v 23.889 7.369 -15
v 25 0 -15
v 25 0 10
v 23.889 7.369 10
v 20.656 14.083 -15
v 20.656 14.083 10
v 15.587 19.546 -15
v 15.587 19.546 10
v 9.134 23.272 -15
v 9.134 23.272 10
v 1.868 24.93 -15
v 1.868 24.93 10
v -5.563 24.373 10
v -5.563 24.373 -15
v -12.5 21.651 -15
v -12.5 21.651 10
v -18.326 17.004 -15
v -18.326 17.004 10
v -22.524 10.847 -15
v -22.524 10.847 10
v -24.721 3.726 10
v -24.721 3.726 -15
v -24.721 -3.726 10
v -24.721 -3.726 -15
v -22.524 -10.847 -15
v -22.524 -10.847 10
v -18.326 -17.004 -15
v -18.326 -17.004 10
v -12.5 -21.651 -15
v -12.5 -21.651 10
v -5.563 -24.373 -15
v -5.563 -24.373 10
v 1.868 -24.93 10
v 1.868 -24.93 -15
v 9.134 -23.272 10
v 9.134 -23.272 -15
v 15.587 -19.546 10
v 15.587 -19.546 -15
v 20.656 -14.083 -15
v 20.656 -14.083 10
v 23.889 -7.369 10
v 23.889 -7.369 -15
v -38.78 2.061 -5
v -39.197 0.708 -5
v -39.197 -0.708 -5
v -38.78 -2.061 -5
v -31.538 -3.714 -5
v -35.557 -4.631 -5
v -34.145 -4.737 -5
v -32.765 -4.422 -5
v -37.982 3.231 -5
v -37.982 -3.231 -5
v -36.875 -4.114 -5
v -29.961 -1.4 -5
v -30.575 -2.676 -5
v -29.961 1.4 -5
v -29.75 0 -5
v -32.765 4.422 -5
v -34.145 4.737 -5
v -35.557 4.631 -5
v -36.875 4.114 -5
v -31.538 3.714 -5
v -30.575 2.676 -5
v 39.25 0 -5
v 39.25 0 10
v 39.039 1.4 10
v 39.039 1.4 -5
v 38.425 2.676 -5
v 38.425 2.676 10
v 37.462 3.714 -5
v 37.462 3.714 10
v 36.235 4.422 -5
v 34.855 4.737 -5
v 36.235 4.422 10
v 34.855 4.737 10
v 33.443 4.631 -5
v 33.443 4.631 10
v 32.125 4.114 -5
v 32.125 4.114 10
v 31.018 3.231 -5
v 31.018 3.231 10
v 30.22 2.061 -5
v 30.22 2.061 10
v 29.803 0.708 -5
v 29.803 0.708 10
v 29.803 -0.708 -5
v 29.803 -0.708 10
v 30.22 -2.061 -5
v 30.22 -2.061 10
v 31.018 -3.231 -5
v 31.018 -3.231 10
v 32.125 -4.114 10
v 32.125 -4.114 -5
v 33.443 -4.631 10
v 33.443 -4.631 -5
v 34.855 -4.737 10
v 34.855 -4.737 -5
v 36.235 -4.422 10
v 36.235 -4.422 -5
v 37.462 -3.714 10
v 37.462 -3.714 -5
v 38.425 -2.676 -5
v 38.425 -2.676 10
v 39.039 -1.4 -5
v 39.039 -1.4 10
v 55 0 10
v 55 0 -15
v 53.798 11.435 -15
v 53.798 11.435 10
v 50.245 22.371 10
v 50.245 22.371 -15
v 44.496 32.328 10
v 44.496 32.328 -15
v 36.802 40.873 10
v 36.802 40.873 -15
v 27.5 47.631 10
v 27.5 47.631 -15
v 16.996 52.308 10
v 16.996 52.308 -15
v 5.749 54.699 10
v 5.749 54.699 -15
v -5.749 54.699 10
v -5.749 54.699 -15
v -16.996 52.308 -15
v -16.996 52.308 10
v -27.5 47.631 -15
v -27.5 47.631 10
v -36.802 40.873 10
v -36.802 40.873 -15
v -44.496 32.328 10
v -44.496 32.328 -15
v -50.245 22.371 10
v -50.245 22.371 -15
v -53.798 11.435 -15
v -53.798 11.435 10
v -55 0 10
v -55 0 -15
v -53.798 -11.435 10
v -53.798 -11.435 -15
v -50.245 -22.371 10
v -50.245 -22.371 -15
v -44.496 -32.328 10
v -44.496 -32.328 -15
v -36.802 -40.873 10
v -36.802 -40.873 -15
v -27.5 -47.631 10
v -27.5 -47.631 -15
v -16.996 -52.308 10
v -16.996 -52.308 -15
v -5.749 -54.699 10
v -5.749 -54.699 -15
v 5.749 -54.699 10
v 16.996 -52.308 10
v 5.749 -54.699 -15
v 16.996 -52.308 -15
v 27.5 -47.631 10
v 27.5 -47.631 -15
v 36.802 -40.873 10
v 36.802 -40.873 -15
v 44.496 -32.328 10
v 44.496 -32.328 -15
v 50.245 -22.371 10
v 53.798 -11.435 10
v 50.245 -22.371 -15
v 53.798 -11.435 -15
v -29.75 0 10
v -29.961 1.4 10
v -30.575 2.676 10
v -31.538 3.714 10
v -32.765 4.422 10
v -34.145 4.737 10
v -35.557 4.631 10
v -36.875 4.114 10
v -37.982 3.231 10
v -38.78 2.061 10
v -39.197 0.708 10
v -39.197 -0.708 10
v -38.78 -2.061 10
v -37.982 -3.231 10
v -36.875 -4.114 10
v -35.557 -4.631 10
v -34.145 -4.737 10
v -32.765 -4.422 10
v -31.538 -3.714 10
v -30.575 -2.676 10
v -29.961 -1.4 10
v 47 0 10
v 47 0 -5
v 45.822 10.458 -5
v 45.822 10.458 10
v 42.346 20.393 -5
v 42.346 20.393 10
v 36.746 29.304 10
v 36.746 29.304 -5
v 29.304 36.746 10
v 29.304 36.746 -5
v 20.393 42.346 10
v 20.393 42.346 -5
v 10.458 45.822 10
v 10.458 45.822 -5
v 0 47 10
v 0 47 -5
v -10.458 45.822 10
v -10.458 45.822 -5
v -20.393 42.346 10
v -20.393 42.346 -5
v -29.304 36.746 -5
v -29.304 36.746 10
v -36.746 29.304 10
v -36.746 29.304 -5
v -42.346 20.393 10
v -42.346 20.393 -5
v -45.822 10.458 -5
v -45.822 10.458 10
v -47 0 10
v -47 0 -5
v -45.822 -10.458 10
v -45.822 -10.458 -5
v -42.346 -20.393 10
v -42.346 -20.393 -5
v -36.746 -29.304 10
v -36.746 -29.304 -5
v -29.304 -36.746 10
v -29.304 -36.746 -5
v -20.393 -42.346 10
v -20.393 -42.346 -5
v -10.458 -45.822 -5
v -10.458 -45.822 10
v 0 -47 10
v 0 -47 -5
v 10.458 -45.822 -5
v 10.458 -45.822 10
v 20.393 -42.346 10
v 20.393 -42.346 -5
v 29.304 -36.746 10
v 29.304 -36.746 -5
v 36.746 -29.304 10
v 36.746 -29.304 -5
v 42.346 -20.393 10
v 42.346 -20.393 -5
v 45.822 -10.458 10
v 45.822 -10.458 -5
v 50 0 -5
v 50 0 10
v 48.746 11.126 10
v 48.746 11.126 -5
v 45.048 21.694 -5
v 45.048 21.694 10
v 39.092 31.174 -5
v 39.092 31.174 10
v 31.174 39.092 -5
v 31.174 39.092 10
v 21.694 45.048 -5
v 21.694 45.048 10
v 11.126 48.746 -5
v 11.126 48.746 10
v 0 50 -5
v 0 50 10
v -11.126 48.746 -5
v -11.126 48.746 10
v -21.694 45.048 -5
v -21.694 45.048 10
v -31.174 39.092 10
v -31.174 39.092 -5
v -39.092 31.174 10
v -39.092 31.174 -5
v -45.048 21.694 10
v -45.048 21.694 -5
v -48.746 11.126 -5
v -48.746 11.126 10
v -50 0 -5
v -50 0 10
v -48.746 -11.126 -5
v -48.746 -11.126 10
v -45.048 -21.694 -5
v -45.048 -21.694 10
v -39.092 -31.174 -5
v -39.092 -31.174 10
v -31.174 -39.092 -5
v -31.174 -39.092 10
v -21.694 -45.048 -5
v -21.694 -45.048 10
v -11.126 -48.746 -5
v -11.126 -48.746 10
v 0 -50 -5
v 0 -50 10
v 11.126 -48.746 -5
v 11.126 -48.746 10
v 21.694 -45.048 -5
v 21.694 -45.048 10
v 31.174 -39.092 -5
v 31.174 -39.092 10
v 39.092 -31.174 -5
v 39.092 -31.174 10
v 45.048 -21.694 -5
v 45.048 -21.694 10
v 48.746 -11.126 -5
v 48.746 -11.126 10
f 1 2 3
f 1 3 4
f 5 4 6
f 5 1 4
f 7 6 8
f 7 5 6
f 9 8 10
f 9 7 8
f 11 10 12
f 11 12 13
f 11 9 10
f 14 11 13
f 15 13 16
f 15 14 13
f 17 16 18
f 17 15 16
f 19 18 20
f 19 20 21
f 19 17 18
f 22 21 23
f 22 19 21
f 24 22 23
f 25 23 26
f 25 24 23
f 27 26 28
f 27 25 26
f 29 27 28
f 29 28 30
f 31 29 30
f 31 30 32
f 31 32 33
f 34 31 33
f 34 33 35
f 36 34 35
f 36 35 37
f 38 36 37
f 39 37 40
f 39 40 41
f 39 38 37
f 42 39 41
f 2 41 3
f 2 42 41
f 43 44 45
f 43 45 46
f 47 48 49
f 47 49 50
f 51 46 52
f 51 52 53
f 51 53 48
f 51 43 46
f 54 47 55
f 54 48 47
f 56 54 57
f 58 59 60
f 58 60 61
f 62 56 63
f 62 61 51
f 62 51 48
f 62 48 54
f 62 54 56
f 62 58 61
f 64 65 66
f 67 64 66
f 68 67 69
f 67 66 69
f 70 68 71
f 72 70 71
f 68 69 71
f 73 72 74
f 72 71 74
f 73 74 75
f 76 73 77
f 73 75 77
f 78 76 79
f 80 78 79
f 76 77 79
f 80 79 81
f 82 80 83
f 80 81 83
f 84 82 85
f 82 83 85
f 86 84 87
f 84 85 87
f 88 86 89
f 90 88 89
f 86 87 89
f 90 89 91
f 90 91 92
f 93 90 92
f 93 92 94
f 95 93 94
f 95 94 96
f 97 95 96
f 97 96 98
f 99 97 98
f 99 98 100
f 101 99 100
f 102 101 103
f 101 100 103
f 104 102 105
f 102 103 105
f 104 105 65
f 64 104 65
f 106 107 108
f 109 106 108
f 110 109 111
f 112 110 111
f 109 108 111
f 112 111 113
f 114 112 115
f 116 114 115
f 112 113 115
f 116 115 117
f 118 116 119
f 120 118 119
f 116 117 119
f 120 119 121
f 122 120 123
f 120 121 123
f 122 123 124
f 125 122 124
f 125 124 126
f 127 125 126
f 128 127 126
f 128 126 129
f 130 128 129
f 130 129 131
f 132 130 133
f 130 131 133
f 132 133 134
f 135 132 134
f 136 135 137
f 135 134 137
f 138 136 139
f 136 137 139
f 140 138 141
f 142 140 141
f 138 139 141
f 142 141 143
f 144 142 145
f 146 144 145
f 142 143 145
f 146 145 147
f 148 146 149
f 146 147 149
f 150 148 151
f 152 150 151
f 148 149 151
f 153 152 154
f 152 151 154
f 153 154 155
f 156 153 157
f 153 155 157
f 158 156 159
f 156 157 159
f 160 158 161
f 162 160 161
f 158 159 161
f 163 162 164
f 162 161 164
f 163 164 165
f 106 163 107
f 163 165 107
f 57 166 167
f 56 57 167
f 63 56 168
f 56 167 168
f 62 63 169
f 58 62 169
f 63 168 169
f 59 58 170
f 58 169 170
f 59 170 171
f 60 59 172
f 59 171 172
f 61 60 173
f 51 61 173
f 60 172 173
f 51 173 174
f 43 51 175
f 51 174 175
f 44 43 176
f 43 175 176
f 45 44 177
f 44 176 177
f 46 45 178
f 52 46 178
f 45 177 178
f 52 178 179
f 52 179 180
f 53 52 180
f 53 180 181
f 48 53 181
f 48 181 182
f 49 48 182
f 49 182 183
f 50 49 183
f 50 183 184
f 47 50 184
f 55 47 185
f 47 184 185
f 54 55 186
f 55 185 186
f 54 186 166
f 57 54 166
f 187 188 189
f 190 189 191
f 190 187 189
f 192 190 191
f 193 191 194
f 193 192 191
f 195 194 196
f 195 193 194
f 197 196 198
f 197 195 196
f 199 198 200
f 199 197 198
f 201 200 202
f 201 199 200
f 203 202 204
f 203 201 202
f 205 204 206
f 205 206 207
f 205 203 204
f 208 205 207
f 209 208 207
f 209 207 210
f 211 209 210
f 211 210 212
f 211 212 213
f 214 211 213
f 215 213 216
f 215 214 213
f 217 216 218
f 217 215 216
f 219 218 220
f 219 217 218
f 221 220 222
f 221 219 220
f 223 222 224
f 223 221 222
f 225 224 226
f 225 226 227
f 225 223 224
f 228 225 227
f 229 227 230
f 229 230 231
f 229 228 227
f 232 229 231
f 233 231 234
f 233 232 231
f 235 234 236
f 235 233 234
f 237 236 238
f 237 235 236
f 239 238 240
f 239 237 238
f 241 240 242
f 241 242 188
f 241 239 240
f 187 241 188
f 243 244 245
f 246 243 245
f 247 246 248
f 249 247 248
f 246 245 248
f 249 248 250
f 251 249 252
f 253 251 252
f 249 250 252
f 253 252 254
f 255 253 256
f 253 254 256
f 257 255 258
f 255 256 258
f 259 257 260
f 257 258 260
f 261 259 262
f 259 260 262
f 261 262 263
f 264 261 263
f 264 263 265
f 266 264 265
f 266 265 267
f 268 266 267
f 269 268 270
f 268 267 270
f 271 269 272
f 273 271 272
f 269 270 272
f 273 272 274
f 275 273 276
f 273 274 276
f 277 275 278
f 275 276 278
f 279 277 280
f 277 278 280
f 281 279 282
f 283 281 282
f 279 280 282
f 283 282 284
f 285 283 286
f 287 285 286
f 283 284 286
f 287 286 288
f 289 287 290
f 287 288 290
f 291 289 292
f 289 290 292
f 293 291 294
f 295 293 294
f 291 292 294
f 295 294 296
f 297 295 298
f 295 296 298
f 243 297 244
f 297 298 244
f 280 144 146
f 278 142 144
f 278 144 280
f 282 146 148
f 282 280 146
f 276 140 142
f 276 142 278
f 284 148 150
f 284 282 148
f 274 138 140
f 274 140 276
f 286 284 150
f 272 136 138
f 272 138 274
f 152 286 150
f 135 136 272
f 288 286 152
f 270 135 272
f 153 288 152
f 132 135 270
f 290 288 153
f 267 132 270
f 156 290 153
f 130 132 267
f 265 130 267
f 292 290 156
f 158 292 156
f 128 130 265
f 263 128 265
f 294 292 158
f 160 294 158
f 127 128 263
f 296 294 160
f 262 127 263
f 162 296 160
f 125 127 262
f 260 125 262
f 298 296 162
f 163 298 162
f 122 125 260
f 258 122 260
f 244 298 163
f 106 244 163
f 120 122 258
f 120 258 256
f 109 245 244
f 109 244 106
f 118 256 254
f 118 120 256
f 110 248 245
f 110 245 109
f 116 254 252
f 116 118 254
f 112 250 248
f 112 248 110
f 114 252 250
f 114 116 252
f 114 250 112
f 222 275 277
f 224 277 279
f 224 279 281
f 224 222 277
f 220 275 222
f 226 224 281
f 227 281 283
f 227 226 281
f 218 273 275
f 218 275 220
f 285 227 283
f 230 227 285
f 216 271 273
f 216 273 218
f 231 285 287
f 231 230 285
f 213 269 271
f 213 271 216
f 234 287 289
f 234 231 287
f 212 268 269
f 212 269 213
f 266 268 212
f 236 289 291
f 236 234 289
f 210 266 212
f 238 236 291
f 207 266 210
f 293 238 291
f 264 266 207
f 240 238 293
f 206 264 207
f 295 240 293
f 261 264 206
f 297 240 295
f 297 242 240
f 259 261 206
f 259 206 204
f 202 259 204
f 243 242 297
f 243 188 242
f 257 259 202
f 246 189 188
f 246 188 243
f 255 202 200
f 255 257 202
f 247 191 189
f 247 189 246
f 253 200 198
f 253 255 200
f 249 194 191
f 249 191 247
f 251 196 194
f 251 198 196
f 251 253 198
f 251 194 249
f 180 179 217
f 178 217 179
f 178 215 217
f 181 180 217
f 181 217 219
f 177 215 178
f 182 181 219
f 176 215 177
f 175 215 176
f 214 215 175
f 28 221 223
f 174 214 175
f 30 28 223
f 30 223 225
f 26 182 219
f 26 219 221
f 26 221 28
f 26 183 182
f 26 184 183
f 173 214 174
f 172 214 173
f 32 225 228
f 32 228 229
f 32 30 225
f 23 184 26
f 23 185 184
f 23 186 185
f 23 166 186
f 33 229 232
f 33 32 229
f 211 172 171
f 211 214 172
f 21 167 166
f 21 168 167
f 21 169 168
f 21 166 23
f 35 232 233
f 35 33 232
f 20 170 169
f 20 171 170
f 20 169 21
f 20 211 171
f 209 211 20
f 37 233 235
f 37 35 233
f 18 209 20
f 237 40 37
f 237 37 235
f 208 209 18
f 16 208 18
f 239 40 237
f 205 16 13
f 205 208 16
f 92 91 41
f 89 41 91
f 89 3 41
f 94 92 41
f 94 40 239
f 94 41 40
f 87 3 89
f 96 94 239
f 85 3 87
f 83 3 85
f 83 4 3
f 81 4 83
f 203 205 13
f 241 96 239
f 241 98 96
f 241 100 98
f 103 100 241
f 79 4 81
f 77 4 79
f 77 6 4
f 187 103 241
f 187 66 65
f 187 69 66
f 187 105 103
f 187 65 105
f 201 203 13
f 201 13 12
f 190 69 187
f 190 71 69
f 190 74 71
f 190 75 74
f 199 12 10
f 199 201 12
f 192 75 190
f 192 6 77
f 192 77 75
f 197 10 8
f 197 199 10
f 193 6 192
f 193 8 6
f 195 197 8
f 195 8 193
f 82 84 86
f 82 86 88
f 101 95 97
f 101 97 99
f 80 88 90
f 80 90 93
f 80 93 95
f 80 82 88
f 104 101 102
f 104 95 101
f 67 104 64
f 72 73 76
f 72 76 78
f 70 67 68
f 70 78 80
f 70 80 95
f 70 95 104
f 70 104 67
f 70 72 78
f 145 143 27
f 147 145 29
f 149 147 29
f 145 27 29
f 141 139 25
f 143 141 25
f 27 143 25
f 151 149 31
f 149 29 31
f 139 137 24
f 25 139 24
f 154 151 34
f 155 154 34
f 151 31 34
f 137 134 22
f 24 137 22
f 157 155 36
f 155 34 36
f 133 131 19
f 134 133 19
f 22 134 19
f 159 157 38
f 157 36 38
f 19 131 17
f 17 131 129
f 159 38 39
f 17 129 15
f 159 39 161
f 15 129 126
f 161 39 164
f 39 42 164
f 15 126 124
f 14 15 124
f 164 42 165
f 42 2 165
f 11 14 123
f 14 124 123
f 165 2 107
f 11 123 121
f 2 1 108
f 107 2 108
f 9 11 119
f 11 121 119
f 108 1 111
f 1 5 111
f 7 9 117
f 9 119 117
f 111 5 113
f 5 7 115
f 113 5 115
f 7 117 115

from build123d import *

# Parameters (mm, degrees)
BOSS_EXTRUDE1_DEPTH      = 10
BOSS_EXTRUDE1_DEPTH_BACK = 15
SKETCH1_R                = 55
SKETCH1_R_2              = 25
SKETCH2_R                = 50
SKETCH2_R_2              = 47
SKETCH2_R_3              = 4.75
CUT_EXTRUDE1_DEPTH       = 15


with BuildPart() as part:
    # Sketch1 → Boss-Extrude1 (new, two sides: drawn at the far end of the back side and taken through both)
    with BuildSketch(Plane.XY.offset(-BOSS_EXTRUDE1_DEPTH_BACK)):
        Circle(SKETCH1_R)
        Circle(SKETCH1_R_2, mode=Mode.SUBTRACT)
    extrude(amount=BOSS_EXTRUDE1_DEPTH + BOSS_EXTRUDE1_DEPTH_BACK)

    # Sketch2 → Cut-Extrude1 (cut)
    # profile 1 of 3: a face of its own
    with BuildSketch(Plane.XY.offset(10)):
        Circle(SKETCH2_R)
        Circle(SKETCH2_R_2, mode=Mode.SUBTRACT)
    # profile 2 of 3: a face of its own
    with BuildSketch(Plane.XY.offset(10)):
        with Locations((-34.5, 0)):
            Circle(SKETCH2_R_3)
    # profile 3 of 3: a face of its own
    with BuildSketch(Plane.XY.offset(10)):
        with Locations((34.5, 0)):
            Circle(SKETCH2_R_3)
    extrude(amount=-CUT_EXTRUDE1_DEPTH, mode=Mode.SUBTRACT)


solid = part.part
